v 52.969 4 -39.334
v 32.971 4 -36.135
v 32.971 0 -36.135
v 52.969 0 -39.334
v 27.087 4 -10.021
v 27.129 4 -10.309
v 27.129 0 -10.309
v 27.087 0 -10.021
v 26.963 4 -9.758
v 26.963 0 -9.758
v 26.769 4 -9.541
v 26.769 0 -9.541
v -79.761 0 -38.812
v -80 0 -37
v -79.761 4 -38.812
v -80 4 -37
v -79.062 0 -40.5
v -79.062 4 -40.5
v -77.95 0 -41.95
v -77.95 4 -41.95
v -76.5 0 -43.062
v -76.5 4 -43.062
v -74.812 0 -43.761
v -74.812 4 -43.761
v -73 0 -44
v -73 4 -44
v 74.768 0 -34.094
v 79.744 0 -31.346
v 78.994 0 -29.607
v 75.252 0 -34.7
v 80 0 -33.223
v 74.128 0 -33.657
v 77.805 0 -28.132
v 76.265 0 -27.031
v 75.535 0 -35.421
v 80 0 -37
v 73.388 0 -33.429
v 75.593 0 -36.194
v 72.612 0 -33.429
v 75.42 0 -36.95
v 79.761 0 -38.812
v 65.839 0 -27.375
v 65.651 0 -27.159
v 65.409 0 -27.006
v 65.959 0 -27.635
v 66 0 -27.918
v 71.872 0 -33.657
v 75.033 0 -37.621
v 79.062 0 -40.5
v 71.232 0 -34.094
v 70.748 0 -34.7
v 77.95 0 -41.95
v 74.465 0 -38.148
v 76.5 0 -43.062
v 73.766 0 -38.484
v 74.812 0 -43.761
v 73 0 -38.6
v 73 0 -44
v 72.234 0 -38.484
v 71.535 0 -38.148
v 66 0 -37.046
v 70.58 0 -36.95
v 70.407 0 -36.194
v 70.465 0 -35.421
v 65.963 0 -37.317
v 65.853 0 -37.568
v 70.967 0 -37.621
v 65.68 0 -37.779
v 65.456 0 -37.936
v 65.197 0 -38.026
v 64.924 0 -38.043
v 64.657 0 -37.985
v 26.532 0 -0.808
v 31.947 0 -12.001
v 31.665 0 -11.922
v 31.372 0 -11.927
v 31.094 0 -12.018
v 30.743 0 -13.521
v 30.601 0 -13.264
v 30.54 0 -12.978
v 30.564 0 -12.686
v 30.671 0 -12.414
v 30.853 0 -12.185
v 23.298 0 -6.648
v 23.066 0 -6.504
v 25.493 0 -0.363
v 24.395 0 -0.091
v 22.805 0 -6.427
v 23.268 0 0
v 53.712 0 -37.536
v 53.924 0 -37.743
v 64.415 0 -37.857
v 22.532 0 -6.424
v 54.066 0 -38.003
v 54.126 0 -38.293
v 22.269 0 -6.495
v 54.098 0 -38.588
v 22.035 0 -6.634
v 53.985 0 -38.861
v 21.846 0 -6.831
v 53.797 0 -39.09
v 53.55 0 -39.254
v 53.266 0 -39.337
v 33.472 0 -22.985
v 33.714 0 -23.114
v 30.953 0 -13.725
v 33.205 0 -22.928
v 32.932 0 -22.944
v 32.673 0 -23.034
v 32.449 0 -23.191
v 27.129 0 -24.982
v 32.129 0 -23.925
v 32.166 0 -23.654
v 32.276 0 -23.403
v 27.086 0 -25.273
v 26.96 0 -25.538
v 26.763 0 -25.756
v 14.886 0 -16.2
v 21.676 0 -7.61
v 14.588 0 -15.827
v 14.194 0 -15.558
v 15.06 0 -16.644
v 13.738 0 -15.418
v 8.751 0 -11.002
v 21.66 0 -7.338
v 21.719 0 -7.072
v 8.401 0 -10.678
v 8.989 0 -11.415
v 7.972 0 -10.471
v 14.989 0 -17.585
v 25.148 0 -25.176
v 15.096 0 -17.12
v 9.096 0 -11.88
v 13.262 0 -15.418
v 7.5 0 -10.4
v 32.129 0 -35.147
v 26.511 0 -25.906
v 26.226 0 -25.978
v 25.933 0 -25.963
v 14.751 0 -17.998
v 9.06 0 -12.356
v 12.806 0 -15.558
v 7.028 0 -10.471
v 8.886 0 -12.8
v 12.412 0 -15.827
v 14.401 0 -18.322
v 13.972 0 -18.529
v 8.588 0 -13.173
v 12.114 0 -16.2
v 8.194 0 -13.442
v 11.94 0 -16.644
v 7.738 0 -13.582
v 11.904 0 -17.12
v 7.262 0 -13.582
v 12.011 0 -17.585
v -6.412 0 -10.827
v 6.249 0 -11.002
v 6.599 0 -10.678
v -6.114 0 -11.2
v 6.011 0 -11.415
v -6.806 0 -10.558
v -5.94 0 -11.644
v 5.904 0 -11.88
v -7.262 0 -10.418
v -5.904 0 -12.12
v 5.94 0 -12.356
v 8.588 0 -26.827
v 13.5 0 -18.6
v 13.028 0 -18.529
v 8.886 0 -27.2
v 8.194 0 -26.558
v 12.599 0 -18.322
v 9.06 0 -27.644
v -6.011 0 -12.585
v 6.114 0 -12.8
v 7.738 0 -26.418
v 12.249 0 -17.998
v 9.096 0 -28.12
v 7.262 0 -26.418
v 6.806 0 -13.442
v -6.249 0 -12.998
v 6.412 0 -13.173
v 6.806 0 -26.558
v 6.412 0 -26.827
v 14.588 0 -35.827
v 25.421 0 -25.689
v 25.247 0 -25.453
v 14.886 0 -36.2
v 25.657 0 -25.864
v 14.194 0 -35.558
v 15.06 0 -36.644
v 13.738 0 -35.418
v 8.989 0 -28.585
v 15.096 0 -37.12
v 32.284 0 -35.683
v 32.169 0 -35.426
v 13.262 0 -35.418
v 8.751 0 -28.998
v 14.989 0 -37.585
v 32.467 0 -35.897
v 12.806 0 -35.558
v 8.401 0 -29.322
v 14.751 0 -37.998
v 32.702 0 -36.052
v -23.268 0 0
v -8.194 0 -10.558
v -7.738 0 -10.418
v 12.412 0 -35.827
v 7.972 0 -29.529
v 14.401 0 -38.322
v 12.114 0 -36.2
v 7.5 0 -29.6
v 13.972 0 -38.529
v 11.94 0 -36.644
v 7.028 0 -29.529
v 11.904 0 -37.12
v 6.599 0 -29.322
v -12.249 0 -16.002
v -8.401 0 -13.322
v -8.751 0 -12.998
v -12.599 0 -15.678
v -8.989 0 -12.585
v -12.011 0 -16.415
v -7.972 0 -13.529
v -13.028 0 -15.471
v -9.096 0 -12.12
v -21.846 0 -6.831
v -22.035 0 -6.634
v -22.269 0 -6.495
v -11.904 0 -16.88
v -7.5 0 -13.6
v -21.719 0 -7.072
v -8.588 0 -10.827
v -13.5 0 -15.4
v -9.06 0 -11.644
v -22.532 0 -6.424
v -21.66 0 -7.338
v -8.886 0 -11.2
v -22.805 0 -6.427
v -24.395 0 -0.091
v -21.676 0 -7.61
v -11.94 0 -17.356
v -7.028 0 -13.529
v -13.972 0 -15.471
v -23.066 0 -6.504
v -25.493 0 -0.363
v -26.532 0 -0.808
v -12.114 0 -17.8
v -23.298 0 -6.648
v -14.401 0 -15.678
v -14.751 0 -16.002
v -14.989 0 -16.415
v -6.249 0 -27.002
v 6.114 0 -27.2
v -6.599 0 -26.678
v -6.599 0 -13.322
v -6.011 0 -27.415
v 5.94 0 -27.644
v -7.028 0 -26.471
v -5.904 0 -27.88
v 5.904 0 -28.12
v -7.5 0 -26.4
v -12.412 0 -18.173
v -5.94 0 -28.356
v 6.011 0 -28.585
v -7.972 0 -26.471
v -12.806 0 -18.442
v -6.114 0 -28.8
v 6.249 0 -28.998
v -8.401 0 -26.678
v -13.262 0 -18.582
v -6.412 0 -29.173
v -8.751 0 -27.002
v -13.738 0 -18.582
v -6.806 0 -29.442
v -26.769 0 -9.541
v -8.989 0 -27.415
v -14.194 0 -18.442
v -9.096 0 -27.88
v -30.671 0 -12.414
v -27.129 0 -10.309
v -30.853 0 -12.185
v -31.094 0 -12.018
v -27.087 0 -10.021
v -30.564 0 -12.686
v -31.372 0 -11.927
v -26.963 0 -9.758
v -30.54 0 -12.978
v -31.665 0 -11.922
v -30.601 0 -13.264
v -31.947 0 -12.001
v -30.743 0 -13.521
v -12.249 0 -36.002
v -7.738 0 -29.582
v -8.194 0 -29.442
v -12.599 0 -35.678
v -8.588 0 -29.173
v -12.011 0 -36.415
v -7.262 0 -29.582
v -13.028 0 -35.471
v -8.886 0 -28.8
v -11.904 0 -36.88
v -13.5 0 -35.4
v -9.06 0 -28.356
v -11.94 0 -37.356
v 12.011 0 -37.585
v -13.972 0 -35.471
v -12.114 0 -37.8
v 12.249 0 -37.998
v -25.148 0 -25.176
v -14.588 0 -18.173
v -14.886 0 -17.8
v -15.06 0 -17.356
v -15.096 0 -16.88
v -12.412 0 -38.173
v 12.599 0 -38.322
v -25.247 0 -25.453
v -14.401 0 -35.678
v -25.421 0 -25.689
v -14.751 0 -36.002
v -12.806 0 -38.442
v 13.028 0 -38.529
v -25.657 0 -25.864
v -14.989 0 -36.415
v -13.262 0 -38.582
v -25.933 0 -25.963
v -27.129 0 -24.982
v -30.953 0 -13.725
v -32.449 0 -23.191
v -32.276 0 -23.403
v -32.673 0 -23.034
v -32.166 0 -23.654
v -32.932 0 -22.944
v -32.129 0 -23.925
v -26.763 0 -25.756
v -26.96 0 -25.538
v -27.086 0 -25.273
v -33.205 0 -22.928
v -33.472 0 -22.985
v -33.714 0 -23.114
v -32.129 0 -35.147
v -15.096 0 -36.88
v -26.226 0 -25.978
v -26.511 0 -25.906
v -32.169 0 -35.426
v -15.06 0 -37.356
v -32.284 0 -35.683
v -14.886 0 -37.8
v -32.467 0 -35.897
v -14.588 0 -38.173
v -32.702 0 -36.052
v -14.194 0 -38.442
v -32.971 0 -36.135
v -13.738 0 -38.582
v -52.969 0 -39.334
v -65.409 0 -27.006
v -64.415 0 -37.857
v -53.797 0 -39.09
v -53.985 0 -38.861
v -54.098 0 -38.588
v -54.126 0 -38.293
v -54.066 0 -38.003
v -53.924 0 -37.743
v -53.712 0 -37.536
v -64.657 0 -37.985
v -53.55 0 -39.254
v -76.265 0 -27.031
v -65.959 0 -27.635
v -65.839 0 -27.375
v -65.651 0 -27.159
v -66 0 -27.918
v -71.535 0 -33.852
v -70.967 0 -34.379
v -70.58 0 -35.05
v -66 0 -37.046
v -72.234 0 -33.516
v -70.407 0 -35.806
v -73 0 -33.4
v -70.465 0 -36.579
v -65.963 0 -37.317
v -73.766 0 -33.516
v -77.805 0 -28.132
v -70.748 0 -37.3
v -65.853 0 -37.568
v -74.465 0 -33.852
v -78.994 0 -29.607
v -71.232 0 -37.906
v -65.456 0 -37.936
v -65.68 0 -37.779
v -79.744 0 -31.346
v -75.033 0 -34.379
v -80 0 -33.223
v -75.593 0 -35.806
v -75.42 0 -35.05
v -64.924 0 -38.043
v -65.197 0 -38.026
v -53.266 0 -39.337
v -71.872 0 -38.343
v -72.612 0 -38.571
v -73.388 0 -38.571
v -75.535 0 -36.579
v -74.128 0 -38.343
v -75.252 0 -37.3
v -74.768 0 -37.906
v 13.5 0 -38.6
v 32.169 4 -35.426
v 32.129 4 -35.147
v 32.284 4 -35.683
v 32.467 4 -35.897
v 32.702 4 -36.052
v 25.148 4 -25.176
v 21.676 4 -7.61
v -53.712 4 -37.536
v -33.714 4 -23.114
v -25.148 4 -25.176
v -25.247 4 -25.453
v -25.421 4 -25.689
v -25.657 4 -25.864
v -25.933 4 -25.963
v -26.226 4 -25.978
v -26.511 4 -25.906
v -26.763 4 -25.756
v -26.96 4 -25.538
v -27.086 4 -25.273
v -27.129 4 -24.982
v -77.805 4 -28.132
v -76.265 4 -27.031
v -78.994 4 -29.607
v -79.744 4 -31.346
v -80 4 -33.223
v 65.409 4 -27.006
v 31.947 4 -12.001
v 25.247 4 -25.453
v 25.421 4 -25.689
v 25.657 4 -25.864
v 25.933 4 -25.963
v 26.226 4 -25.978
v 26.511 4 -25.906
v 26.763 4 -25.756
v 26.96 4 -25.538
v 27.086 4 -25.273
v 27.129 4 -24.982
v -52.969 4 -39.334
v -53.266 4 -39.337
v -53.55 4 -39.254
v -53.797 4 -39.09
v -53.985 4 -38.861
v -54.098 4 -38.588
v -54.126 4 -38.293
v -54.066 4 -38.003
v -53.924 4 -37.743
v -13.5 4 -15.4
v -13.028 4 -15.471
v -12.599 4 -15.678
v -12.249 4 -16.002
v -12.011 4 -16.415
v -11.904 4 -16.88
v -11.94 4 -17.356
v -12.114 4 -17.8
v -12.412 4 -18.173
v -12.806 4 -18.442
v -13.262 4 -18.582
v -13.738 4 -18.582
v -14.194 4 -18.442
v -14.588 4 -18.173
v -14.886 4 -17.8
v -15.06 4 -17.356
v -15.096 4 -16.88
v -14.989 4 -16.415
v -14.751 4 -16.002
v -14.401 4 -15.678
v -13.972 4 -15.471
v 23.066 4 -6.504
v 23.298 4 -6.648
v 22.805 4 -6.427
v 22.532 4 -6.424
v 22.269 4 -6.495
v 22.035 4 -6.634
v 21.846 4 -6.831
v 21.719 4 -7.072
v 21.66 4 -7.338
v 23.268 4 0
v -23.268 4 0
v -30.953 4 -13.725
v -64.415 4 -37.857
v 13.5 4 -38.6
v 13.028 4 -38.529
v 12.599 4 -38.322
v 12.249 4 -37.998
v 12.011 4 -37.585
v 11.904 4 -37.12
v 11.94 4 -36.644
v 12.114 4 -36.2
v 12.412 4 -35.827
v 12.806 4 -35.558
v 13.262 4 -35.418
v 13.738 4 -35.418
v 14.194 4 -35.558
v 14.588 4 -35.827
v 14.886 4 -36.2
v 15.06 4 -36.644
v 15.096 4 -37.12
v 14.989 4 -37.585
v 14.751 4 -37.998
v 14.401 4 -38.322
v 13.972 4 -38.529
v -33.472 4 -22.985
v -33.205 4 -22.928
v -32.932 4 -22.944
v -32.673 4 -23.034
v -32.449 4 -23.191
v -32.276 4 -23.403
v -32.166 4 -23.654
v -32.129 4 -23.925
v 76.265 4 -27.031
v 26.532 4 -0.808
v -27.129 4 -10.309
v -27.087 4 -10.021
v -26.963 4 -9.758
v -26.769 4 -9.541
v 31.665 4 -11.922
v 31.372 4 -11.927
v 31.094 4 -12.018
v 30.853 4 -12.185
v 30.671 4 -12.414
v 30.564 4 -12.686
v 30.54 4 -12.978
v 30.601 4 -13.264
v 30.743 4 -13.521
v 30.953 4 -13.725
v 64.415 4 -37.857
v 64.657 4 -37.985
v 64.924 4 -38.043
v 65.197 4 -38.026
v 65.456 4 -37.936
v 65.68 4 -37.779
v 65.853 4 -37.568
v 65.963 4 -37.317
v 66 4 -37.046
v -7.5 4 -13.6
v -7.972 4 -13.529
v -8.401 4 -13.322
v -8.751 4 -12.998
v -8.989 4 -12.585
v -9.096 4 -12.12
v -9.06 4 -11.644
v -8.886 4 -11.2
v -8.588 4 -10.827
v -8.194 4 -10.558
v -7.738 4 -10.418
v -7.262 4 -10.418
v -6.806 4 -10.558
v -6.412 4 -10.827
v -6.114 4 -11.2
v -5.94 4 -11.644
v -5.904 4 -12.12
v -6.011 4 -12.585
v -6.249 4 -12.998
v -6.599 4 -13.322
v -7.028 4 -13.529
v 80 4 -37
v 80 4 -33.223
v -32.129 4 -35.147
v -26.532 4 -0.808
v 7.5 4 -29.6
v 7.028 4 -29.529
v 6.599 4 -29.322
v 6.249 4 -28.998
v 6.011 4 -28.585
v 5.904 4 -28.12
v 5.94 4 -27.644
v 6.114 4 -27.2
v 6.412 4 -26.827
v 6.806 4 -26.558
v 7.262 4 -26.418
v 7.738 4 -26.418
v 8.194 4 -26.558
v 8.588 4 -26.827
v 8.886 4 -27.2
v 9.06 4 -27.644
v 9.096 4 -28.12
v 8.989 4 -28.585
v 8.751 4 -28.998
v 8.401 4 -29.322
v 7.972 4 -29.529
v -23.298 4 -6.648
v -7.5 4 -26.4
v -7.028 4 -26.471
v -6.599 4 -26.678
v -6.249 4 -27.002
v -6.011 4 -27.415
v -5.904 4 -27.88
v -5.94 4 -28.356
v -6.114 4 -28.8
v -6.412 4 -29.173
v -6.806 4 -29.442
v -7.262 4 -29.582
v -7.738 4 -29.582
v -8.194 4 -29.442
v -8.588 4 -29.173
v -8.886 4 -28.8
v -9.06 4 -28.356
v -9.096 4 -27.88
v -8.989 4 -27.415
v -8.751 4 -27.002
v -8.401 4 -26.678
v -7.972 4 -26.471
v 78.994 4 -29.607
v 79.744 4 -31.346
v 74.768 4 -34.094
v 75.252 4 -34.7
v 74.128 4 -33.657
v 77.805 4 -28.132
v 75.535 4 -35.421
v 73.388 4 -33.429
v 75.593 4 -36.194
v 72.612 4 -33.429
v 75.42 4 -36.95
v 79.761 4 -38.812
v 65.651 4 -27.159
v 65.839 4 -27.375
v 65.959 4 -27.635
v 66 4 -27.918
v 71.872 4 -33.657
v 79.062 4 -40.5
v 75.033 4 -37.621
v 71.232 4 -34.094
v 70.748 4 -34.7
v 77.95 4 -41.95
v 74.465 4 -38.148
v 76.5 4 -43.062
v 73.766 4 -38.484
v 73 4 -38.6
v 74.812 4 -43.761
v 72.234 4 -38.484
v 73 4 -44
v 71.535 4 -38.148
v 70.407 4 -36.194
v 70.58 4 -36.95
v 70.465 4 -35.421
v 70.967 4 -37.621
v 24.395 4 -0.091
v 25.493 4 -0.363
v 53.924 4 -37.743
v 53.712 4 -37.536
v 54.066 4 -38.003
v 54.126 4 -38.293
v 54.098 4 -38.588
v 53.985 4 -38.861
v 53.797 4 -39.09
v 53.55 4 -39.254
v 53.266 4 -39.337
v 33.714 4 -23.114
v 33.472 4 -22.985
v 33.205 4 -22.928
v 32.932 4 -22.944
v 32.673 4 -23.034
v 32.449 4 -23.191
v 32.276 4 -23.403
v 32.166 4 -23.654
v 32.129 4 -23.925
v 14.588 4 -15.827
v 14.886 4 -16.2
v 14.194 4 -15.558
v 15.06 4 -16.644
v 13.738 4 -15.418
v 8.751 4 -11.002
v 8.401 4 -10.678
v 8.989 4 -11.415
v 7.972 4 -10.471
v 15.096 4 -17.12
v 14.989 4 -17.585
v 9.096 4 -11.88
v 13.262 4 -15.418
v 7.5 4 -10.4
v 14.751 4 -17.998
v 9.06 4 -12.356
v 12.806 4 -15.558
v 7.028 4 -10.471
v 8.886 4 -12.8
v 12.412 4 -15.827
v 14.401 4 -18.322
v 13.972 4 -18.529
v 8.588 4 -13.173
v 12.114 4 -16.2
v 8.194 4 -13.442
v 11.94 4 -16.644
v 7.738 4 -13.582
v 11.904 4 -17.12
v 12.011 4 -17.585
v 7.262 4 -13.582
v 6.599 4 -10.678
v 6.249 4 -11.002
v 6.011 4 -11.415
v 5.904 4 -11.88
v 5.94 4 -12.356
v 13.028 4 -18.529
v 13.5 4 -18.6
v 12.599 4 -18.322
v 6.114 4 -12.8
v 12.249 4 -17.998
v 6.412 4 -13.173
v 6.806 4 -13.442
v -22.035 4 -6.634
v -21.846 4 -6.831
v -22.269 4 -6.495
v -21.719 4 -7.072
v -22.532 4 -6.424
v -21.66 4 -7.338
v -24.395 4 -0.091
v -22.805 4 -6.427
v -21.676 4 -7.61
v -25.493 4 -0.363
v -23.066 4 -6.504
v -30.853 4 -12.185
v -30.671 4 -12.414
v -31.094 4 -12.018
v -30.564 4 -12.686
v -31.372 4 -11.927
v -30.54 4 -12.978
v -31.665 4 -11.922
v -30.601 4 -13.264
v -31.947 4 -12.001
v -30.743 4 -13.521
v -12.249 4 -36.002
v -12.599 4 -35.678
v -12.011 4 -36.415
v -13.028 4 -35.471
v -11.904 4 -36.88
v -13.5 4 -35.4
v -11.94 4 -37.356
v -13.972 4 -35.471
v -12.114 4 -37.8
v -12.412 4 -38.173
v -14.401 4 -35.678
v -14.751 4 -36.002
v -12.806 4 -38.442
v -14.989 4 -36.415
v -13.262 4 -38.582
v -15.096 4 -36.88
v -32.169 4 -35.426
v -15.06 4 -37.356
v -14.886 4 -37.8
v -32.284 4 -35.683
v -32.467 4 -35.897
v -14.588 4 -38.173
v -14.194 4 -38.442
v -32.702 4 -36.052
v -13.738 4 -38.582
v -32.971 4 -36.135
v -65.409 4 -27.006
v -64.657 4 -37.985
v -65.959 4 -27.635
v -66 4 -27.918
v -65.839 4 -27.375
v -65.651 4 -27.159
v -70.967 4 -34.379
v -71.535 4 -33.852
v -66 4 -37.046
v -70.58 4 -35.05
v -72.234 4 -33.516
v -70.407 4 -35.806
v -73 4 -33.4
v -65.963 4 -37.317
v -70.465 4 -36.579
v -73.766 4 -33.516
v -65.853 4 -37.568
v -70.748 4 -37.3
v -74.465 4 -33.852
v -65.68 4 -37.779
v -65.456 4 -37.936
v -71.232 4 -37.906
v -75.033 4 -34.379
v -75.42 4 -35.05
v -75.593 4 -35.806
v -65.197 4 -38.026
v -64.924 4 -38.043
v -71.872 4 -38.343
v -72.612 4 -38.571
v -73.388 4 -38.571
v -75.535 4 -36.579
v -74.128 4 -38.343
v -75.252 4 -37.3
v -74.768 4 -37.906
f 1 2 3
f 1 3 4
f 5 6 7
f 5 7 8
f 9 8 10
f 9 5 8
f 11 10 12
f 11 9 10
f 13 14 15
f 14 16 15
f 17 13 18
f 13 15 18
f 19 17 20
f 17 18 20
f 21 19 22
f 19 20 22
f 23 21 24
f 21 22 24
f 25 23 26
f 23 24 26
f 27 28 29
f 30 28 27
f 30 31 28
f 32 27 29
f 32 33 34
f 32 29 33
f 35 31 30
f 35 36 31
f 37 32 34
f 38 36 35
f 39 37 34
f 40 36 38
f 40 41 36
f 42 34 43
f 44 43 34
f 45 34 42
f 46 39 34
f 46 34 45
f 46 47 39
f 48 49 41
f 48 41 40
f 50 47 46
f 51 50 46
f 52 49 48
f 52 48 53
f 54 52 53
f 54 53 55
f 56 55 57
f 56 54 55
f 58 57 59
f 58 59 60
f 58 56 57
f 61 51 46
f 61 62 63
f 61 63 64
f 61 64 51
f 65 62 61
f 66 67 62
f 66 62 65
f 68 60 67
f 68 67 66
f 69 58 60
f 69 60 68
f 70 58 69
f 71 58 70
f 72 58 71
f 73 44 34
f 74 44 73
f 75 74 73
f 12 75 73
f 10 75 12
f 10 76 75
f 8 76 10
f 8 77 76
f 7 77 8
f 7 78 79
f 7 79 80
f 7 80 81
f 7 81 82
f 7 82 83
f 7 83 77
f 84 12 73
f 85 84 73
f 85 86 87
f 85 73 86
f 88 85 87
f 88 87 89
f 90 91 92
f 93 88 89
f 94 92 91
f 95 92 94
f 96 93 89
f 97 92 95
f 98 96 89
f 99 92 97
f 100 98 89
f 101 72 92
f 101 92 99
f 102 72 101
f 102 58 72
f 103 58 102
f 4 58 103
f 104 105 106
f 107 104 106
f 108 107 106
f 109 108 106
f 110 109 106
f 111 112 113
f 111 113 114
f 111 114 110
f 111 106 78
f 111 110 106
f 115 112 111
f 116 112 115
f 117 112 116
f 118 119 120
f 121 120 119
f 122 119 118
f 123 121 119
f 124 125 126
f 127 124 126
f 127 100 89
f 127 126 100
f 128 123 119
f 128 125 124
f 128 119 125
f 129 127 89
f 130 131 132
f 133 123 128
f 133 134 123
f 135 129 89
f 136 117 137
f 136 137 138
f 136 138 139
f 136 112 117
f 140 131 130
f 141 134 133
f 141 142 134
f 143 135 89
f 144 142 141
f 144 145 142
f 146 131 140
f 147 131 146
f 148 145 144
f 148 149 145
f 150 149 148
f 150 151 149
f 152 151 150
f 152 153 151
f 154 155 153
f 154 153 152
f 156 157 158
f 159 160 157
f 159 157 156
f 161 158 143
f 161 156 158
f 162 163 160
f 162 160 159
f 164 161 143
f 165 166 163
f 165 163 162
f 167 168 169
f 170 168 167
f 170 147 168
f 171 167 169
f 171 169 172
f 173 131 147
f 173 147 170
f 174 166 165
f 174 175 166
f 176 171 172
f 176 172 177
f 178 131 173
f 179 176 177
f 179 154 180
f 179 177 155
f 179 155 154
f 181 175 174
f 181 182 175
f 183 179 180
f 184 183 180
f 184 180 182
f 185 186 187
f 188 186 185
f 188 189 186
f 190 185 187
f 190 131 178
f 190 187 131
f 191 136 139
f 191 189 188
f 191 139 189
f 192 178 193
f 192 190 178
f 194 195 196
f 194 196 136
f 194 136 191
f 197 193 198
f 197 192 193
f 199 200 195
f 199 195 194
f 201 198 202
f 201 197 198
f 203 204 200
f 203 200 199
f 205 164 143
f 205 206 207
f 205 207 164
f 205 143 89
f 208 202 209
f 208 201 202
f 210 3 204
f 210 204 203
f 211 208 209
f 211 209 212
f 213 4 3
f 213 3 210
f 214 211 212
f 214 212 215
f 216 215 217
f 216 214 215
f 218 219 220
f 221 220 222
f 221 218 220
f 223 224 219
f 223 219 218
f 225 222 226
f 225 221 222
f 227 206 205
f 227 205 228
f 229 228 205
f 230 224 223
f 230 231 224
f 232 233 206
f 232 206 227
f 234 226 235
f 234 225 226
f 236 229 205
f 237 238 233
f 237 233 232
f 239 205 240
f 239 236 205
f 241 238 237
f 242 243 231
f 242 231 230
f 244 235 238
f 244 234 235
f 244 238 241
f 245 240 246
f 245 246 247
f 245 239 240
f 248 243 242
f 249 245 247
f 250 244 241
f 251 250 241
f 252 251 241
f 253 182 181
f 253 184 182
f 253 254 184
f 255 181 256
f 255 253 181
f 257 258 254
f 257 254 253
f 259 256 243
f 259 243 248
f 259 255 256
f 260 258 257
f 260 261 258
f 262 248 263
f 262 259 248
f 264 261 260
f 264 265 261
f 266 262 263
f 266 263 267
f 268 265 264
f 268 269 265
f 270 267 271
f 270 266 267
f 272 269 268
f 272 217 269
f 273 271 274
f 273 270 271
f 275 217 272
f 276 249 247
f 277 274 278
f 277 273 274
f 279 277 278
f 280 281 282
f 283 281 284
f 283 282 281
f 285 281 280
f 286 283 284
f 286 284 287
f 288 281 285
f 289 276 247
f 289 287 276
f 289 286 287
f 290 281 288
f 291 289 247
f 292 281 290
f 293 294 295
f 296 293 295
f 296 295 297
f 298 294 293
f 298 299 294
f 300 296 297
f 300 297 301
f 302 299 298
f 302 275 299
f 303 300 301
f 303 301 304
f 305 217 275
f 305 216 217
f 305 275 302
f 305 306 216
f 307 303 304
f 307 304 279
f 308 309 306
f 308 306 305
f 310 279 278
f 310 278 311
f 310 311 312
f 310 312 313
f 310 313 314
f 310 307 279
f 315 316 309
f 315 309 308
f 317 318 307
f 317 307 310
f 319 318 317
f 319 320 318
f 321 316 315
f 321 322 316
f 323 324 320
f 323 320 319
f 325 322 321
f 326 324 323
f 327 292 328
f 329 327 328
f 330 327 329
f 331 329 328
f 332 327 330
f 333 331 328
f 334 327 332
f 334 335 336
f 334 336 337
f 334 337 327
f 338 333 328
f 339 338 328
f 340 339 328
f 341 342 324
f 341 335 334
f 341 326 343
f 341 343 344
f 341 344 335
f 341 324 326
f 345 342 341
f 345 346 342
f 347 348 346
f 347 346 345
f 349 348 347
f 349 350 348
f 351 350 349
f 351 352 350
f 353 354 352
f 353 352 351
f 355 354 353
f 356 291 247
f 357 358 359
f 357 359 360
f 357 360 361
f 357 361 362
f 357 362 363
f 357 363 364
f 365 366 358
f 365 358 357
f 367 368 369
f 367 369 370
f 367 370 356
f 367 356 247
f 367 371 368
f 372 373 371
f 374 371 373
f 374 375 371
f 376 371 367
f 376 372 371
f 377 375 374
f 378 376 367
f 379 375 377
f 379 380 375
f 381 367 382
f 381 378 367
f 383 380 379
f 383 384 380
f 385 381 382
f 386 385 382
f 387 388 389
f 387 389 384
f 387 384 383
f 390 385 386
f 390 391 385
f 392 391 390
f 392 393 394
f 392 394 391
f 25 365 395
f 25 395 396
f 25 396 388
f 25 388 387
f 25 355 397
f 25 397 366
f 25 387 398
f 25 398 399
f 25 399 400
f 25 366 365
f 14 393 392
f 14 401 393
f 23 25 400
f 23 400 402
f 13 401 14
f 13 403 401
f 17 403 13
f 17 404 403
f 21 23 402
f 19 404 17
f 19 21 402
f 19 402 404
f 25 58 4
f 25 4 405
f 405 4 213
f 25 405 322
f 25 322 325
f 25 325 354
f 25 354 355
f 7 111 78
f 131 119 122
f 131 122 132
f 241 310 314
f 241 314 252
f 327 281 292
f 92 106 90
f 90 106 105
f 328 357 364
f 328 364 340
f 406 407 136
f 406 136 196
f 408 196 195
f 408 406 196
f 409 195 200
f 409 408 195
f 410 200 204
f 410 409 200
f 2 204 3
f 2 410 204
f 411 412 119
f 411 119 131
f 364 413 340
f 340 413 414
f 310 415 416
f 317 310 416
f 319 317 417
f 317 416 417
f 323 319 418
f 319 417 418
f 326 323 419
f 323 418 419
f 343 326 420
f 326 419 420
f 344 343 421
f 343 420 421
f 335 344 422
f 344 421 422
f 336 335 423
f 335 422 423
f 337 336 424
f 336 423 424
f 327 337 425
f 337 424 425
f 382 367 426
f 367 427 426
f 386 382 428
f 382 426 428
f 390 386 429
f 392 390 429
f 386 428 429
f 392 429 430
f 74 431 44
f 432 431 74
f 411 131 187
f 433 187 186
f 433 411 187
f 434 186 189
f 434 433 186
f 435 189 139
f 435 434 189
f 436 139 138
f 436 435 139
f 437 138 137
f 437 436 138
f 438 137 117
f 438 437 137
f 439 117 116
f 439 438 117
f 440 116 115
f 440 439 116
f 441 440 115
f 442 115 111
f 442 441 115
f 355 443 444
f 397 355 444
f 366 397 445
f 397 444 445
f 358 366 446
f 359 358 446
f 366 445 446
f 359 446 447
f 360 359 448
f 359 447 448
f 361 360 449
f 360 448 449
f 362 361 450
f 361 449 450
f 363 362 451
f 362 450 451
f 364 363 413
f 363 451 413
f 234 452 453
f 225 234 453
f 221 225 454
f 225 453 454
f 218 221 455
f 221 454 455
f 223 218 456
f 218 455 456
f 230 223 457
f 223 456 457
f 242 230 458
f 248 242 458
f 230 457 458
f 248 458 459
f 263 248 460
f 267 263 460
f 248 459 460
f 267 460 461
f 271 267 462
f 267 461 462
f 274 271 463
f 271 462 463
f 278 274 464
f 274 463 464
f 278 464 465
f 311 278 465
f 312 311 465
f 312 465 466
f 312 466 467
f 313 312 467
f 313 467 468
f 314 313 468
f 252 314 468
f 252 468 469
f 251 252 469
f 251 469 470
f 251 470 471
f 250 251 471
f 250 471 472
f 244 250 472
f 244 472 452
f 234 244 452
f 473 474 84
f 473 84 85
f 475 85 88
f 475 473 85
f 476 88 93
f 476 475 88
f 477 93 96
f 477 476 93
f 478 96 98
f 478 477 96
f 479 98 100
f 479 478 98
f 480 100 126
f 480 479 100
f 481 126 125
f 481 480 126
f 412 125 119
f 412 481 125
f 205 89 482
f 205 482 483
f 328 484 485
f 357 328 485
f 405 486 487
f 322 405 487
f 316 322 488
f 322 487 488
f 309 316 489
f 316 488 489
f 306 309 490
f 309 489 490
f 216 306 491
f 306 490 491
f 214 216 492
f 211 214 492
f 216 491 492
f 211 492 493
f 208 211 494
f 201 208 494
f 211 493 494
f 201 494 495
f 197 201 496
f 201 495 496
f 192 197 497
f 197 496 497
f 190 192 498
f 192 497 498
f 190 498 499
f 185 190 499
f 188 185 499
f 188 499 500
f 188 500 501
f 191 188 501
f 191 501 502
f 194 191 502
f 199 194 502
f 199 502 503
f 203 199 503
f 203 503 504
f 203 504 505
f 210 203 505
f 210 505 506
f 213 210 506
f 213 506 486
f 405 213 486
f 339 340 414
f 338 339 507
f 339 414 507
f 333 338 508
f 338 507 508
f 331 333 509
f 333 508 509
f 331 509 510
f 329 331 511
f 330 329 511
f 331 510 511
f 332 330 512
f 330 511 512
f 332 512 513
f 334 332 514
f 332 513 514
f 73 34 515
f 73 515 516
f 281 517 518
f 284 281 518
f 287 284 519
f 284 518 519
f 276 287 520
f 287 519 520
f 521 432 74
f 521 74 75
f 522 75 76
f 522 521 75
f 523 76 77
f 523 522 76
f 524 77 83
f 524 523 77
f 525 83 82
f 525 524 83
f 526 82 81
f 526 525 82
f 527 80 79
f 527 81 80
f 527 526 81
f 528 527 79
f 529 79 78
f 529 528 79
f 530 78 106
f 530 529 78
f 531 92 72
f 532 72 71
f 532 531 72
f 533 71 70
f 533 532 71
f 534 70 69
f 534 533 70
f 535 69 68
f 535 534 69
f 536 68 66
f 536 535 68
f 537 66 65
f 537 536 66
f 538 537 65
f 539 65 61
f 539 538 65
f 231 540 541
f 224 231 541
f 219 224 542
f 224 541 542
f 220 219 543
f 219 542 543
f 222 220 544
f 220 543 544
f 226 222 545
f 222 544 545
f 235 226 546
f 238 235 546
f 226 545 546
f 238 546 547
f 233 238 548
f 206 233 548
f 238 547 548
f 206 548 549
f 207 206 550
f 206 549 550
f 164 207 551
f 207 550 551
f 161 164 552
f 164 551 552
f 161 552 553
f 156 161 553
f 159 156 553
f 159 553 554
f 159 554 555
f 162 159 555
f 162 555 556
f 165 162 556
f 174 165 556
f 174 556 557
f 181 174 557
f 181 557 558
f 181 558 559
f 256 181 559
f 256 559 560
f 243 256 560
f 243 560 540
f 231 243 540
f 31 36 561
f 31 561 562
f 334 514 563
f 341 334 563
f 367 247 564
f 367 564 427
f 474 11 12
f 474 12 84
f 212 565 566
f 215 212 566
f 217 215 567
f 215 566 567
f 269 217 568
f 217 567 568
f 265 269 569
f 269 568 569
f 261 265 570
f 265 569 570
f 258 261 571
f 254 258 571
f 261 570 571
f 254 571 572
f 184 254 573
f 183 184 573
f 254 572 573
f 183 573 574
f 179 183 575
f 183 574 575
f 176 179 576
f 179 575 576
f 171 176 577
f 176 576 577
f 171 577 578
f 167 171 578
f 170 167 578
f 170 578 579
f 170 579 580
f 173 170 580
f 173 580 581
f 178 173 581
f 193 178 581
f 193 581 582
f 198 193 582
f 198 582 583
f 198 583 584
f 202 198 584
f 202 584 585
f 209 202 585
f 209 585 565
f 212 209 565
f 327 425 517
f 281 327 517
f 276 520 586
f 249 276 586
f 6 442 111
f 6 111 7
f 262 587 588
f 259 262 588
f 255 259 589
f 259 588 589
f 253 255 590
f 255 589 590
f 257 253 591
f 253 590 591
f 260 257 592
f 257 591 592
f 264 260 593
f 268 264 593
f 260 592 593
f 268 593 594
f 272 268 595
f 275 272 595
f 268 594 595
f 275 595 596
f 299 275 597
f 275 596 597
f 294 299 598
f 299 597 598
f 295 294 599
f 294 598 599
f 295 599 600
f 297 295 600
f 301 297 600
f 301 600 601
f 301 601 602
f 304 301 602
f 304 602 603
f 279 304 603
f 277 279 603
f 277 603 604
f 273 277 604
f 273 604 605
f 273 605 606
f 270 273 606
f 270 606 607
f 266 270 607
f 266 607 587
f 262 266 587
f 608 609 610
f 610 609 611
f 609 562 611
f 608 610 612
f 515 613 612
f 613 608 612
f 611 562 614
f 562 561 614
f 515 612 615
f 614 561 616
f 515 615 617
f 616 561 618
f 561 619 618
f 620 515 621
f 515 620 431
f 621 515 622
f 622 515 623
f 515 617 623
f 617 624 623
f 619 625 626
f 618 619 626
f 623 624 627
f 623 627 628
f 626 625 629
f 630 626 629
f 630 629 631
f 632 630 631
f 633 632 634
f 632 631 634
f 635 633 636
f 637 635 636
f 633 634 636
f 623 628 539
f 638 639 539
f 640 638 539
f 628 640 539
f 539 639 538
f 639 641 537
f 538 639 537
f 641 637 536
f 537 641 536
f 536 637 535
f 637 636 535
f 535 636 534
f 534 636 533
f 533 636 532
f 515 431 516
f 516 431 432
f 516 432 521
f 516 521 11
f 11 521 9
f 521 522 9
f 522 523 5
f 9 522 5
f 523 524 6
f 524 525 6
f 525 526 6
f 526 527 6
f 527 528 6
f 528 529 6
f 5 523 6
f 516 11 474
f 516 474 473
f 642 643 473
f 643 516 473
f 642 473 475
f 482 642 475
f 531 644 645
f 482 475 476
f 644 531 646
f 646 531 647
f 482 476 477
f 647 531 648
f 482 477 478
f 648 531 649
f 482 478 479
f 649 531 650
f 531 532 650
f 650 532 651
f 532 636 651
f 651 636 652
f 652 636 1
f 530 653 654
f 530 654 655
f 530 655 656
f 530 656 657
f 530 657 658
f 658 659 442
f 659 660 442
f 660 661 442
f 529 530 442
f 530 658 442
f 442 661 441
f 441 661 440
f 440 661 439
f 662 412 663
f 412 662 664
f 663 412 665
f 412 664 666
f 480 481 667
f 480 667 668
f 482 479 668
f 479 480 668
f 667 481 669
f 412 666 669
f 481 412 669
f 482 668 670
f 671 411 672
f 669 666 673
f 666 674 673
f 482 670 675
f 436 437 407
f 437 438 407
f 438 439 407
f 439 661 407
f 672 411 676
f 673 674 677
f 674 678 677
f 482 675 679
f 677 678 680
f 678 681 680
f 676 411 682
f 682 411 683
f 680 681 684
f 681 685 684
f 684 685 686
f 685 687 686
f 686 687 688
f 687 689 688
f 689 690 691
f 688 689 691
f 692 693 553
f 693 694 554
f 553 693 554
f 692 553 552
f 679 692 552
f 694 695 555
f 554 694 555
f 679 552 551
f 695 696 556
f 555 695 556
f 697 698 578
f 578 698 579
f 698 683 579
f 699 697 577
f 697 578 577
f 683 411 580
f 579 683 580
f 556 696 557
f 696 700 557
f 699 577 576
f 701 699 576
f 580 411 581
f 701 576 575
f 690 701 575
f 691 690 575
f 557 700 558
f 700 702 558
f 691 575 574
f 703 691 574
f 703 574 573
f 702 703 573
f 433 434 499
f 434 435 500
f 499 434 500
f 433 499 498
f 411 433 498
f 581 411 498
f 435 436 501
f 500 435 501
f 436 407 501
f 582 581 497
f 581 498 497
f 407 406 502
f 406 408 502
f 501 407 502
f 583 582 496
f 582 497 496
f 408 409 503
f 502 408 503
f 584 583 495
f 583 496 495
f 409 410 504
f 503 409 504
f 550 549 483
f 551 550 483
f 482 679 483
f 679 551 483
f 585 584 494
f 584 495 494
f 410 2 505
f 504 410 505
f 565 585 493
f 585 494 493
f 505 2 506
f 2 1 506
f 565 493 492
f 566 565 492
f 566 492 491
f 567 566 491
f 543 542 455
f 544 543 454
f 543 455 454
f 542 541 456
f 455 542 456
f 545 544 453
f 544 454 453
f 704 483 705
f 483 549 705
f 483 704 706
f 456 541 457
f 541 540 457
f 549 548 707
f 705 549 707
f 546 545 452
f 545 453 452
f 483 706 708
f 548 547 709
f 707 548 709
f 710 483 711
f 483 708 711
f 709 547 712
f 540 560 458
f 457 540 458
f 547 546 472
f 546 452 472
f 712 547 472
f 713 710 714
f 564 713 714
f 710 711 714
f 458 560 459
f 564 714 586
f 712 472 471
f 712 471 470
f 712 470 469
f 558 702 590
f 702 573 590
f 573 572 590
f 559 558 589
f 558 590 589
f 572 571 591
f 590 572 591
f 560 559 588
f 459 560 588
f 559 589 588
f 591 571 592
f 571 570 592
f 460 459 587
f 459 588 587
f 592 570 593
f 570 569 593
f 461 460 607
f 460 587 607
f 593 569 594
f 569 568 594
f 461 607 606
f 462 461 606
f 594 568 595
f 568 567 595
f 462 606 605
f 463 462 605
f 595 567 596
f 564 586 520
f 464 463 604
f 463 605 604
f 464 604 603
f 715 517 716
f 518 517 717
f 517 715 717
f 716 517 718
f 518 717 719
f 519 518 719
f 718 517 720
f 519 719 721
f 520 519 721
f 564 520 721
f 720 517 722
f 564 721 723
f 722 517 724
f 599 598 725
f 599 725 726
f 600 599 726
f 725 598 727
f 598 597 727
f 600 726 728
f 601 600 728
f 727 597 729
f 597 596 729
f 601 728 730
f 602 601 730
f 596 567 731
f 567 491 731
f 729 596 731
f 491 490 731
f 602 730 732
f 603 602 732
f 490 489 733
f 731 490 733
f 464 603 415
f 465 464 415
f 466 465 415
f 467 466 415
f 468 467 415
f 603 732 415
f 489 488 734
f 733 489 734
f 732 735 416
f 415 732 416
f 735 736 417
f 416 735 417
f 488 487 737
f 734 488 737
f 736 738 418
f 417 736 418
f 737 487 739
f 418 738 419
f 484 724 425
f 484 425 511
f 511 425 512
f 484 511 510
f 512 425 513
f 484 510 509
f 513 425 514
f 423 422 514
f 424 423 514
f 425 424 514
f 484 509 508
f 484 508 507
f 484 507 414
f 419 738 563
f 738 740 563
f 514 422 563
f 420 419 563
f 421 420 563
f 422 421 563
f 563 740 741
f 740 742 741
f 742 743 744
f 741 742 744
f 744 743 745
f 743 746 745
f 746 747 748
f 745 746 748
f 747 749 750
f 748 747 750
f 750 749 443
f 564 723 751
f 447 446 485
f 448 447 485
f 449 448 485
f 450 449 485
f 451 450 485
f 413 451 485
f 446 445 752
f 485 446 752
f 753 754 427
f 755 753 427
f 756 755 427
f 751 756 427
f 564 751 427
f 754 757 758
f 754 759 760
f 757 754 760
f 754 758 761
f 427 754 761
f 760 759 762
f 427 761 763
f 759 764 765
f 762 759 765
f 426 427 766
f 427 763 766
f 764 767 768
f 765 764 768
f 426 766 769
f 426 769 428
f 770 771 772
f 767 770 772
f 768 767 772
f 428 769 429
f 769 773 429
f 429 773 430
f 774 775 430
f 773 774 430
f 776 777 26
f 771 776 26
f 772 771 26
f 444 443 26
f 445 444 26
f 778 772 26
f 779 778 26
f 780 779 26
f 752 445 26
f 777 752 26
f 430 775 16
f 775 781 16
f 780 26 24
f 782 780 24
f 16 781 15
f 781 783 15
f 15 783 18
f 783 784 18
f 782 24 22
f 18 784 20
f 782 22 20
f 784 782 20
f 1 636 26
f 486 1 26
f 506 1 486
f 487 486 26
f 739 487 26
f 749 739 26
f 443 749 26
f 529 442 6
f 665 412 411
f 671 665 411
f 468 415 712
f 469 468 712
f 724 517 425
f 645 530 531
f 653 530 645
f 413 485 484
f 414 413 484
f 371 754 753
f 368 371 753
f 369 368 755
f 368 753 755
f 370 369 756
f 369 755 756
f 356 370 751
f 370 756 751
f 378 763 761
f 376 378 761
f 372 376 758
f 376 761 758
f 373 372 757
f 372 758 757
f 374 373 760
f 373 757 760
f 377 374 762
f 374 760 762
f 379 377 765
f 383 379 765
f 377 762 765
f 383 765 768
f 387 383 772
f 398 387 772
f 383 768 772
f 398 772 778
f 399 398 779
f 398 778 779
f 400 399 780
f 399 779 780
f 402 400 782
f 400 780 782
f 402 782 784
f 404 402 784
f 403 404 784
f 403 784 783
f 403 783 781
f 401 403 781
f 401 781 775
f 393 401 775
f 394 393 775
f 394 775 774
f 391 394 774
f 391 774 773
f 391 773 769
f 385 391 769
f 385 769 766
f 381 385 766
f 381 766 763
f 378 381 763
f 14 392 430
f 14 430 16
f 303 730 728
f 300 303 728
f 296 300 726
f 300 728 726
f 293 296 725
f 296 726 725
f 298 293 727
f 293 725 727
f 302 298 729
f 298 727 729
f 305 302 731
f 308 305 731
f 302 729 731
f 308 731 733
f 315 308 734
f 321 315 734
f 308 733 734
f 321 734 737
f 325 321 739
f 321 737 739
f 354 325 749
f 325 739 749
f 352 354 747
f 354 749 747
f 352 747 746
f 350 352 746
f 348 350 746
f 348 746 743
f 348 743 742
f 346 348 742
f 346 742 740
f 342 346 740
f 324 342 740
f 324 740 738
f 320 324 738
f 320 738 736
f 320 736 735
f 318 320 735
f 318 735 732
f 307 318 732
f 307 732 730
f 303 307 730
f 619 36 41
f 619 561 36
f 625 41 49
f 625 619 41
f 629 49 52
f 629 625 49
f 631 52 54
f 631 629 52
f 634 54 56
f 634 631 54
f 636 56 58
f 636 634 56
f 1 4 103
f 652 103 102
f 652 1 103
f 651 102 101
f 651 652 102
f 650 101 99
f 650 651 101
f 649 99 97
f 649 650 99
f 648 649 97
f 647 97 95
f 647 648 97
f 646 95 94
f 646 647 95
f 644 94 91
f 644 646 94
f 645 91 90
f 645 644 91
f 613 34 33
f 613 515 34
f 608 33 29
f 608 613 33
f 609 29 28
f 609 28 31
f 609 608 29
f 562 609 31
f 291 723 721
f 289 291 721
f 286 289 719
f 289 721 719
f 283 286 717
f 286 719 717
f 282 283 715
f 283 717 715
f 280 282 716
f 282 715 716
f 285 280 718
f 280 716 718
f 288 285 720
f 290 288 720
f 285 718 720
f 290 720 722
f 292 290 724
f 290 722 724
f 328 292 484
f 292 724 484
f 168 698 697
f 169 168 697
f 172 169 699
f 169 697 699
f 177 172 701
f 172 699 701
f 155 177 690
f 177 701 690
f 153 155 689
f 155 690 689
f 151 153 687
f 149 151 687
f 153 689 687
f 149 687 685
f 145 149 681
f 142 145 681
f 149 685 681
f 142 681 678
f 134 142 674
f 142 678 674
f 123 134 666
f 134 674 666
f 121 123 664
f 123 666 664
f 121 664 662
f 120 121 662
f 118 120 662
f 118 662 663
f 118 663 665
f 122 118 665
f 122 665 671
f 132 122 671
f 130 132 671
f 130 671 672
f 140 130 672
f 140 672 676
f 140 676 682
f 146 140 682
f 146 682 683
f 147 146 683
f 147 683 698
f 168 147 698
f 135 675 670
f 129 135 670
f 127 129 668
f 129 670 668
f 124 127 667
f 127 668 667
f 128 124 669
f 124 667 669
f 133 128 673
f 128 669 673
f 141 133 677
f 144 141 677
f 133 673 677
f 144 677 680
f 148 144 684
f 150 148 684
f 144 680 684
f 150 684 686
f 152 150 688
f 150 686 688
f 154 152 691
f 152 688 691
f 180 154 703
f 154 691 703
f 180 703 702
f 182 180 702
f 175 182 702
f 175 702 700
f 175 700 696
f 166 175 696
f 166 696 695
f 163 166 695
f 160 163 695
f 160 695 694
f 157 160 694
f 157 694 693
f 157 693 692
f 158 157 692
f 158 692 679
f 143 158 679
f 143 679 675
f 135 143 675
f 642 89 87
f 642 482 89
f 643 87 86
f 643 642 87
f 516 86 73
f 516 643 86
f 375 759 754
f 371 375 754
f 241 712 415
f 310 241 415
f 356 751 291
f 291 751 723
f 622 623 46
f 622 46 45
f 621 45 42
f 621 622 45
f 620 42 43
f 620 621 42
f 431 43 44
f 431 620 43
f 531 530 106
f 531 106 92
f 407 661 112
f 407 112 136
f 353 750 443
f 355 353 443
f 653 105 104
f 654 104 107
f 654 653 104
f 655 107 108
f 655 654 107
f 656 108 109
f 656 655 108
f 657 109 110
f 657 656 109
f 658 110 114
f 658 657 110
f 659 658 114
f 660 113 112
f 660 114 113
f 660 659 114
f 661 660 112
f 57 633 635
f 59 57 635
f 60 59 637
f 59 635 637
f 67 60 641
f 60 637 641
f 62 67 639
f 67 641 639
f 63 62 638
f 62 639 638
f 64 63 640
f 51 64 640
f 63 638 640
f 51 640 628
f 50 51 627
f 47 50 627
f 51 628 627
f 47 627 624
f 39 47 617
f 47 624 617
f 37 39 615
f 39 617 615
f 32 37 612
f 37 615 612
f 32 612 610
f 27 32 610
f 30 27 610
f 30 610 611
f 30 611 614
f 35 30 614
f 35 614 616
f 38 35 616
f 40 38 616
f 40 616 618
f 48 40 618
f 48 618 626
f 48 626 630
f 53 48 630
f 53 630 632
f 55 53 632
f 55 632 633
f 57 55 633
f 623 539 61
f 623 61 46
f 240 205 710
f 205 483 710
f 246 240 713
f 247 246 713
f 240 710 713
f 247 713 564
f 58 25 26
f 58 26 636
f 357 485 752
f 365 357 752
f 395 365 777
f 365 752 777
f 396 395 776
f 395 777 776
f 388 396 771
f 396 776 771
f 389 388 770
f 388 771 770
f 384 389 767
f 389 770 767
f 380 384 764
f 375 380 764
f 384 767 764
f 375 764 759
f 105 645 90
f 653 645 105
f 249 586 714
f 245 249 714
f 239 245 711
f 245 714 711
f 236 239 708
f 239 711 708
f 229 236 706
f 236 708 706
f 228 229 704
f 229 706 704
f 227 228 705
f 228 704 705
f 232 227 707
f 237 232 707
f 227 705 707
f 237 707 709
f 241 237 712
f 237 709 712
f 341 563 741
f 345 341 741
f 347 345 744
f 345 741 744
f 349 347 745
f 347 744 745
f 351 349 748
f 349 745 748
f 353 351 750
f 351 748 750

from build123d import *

# Parameters (mm, degrees)
EXTRUDE_1_DEPTH     = 4
SKETCH_2_R          = 1.6
CUT_EXTRUDE_1_DEPTH = 92.38927727
SKETCH_3_R          = 2.6
SKETCH_3_R_2        = 1.6
CUT_EXTRUDE_2_DEPTH = 92.38927727
FILLET_1_R          = 7


with BuildPart() as part:
    # 草图1 → 凸台-拉伸1 (new body)
    with BuildSketch(Plane(origin=(0, 0, 0), x_dir=(1, 0, 0), z_dir=(0, 1, 0))):
        Polygon((25, 0), (-25, 0), (-80, 29), (-80, 44), (80, 44), (80, 29), align=None)
    extrude(amount=EXTRUDE_1_DEPTH)

    # 草图2 → 切除-拉伸1 (cut, through all)
    with BuildSketch(Plane(origin=(0, 4, 0), x_dir=(1, 0, 0), z_dir=(0, 1, 0))):
        with Locations(Location((-7.5, 28, 0), (0, 0, 270))):
            Circle(SKETCH_2_R)
        with Locations(Location((7.5, 28, 0), (0, 0, 90))):
            Circle(SKETCH_2_R)
        with Locations(Location((-7.5, 12, 0), (0, 0, 90))):
            Circle(SKETCH_2_R)
        with Locations(Location((7.5, 12, 0), (0, 0, 270))):
            Circle(SKETCH_2_R)
    extrude(amount=-CUT_EXTRUDE_1_DEPTH, mode=Mode.SUBTRACT)

    # 草图3 → 切除-拉伸2 (cut, through all)
    with BuildSketch(Plane(origin=(0, 4, 0), x_dir=(1, 0, 0), z_dir=(0, 1, 0))):
        with Locations(Location((-73, 36, 0), (0, 0, 270))):
            Circle(SKETCH_3_R)
        with Locations(Location((73, 36, 0), (0, 0, 90))):
            Circle(SKETCH_3_R)
        with Locations(Location((-13.5, 17, 0), (0, 0, 270))):
            Circle(SKETCH_3_R_2)
        with Locations(Location((-13.5, 37, 0), (0, 0, 270))):
            Circle(SKETCH_3_R_2)
        with Locations(Location((13.5, 17, 0), (0, 0, 90))):
            Circle(SKETCH_3_R_2)
        with Locations(Location((13.5, 37, 0), (0, 0, 90))):
            Circle(SKETCH_3_R_2)
        with BuildLine():
            Line((-66, 37.045901786), (-66, 27.918180848))
            ThreePointArc((-66, 27.918180848), (-65.839389964, 27.374651191), (-65.409151024, 27.005714169))
            Line((-65.409151024, 27.005714169), (-31.946763962, 12.00114442))
            ThreePointArc((-31.946763962, 12.00114442), (-30.671368472, 12.413990718), (-30.952679882, 13.724692673))
            Line((-30.952679882, 13.724692673), (-64.415066944, 37.85698336))
            ThreePointArc((-64.415066944, 37.85698336), (-65.455558418, 37.936107677), (-66, 37.045901786))
        make_face()
        with BuildLine():
            Line((-53.712306987, 37.53593293), (-33.713971886, 23.113601522))
            ThreePointArc((-33.713971886, 23.113601522), (-32.673480412, 23.034477205), (-32.12903883, 23.924683096))
            Line((-32.12903883, 23.924683096), (-32.12903883, 35.147280888))
            ThreePointArc((-32.12903883, 35.147280888), (-32.368121456, 35.796129676), (-32.971048329, 36.13472152))
            Line((-32.971048329, 36.13472152), (-52.96938343, 39.334455136))
            ThreePointArc((-52.96938343, 39.334455136), (-54.051625259, 38.728799106), (-53.712306987, 37.53593293))
        make_face()
        with BuildLine():
            Line((-21.676324022, 7.610054966), (-25.148014353, 25.176303846))
            ThreePointArc((-25.148014353, 25.176303846), (-26.22644397, 25.97766474), (-27.12903883, 24.982419926))
            Line((-27.12903883, 24.982419926), (-27.12903883, 10.309246321))
            ThreePointArc((-27.12903883, 10.309246321), (-27.034628251, 9.885090925), (-26.76922323, 9.541025042))
            Line((-26.76922323, 9.541025042), (-23.2975329, 6.647949766))
            ThreePointArc((-23.2975329, 6.647949766), (-22.147000978, 6.556202787), (-21.676324022, 7.610054966))
        make_face()
        with BuildLine():
            Line((26.76922323, 9.541025042), (23.2975329, 6.647949766))
            ThreePointArc((23.2975329, 6.647949766), (22.147000978, 6.556202787), (21.676324022, 7.610054966))
            Line((21.676324022, 7.610054966), (25.148014353, 25.176303846))
            ThreePointArc((25.148014353, 25.176303846), (26.22644397, 25.97766474), (27.12903883, 24.982419926))
            Line((27.12903883, 24.982419926), (27.12903883, 10.309246321))
            ThreePointArc((27.12903883, 10.309246321), (27.034628251, 9.885090925), (26.76922323, 9.541025042))
        make_face()
        with BuildLine():
            Line((32.971048329, 36.13472152), (52.96938343, 39.334455136))
            ThreePointArc((52.96938343, 39.334455136), (54.051625259, 38.728799106), (53.712306987, 37.53593293))
            Line((53.712306987, 37.53593293), (33.713971886, 23.113601522))
            ThreePointArc((33.713971886, 23.113601522), (32.673480412, 23.034477205), (32.12903883, 23.924683096))
            Line((32.12903883, 23.924683096), (32.12903883, 35.147280888))
            ThreePointArc((32.12903883, 35.147280888), (32.368121456, 35.796129676), (32.971048329, 36.13472152))
        make_face()
        with BuildLine():
            Line((30.952679882, 13.724692673), (64.415066944, 37.85698336))
            ThreePointArc((64.415066944, 37.85698336), (65.455558418, 37.936107677), (66, 37.045901786))
            Line((66, 37.045901786), (66, 27.918180848))
            ThreePointArc((66, 27.918180848), (65.839389964, 27.374651191), (65.409151024, 27.005714169))
            Line((65.409151024, 27.005714169), (31.946763962, 12.00114442))
            ThreePointArc((31.946763962, 12.00114442), (30.671368472, 12.413990718), (30.952679882, 13.724692673))
        make_face()
    extrude(amount=-CUT_EXTRUDE_2_DEPTH, mode=Mode.SUBTRACT)

    # 圆角1
    fillet_1_edges = [part.edges().sort_by_distance(p)[0] for p in [
        (-80, 2, -29),
        (-80, 2, -44),
        (80, 2, -44),
        (80, 2, -29),
        (25, 2, 0),
        (-25, 2, 0),
    ]]
    fillet(fillet_1_edges, radius=FILLET_1_R)


solid = part.part
